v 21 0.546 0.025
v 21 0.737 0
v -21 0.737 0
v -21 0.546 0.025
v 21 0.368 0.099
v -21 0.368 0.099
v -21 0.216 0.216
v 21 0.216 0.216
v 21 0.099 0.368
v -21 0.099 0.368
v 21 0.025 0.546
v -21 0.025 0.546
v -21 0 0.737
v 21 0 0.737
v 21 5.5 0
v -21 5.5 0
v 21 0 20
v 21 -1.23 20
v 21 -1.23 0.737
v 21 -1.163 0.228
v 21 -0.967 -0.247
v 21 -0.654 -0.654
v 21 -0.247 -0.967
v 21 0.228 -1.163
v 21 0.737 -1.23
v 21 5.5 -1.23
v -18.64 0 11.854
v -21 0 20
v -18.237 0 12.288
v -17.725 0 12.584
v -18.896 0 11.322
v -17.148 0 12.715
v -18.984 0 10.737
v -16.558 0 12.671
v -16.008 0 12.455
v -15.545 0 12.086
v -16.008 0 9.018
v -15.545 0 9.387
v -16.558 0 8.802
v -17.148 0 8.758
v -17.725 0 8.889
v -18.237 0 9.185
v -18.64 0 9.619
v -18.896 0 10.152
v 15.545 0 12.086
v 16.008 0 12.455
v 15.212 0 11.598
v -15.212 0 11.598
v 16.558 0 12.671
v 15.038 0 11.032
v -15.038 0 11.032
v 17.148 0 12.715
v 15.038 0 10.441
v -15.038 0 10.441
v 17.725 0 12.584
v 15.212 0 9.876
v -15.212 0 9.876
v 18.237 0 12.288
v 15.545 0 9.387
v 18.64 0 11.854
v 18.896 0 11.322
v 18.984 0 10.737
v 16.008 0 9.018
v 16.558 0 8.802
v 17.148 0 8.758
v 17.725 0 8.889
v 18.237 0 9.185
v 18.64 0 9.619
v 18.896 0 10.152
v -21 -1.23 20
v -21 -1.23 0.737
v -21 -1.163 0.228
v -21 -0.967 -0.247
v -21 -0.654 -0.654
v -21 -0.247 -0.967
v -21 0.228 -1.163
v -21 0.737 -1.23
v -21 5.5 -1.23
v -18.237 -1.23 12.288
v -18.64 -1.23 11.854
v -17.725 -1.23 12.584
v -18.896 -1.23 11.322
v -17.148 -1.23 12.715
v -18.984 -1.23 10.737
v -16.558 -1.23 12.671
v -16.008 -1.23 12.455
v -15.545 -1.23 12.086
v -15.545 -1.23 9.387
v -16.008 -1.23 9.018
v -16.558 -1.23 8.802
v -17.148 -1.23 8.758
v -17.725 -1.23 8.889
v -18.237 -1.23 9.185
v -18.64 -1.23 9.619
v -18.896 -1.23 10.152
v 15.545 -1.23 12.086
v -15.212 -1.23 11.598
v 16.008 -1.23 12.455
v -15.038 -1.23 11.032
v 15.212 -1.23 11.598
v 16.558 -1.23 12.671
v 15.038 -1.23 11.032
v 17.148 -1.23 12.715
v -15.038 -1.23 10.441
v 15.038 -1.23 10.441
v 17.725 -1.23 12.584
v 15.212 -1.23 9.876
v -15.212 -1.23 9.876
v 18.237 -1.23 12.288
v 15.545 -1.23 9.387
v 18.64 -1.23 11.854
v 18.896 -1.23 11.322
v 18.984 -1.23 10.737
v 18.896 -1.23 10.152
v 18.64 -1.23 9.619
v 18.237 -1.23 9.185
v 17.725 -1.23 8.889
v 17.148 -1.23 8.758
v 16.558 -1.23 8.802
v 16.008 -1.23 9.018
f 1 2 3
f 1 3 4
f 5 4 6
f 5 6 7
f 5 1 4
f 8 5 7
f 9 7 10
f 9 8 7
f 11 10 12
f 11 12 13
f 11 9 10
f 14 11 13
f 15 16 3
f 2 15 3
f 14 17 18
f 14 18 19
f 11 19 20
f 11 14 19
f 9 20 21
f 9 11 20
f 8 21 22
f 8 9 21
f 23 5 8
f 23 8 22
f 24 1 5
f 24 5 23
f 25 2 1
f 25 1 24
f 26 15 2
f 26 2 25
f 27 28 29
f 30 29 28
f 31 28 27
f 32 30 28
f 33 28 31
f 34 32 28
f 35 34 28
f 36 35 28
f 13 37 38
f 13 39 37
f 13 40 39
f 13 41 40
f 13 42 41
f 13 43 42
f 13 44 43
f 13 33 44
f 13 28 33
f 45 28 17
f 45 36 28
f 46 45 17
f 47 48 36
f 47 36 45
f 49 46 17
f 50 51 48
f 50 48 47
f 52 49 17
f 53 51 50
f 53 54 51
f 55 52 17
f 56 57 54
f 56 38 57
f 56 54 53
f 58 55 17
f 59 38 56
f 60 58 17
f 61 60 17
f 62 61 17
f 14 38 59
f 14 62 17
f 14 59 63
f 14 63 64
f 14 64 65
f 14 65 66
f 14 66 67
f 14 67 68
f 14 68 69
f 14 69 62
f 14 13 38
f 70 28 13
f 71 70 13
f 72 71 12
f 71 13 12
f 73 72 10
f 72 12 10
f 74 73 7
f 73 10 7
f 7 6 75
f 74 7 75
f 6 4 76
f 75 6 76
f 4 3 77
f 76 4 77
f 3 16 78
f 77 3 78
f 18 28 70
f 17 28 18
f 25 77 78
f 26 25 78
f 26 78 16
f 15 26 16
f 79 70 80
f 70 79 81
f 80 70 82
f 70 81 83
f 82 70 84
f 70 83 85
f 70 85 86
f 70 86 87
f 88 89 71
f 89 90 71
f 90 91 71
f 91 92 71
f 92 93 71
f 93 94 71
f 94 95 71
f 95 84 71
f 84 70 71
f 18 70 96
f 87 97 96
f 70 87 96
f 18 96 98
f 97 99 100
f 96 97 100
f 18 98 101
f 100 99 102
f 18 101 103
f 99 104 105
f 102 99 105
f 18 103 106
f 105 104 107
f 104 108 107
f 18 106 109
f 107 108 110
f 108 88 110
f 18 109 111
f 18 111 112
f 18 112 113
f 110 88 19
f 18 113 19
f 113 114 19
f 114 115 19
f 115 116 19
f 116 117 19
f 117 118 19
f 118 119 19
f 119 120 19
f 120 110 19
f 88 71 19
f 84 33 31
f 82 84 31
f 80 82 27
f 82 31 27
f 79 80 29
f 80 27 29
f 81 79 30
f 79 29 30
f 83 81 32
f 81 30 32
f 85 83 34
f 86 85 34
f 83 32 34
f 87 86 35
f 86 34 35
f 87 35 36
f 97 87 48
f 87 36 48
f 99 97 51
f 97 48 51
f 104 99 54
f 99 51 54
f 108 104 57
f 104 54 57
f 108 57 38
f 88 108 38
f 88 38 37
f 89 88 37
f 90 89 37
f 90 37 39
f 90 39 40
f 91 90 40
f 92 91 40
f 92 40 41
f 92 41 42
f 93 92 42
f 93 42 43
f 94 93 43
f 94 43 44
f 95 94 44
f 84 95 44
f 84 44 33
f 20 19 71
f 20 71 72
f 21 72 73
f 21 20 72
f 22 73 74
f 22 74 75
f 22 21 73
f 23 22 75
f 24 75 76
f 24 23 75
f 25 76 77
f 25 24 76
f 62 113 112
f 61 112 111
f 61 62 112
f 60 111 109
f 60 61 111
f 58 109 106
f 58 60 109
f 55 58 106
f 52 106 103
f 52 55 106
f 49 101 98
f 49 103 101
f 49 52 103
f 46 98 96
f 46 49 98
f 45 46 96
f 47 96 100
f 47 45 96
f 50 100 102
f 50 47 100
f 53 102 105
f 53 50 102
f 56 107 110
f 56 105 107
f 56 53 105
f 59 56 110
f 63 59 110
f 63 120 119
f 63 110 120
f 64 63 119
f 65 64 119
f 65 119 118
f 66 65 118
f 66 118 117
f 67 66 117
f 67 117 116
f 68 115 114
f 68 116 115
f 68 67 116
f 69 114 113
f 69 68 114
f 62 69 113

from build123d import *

# Parameters (mm, degrees)
SKETCH1_W                    = 42
SKETCH1_H                    = 1.23
BASE_FLANGE1_DEPTH           = 20
EDGE_FLANGE1_STRIP_W         = 6.3932
EDGE_FLANGE1_STRIP_H         = 1.23
EDGE_FLANGE1_STRIP_CUT_DEPTH = 42
EDGE_FLANGE1_DEPTH           = 42
SKETCH9_R                    = 1.984375
CUT_EXTRUDE1_DEPTH           = 30.516944286


# Sheet-metal steps are written as plain solids
with BuildPart() as part:
    # Sketch1 → Base-Flange1 (new body)
    with BuildSketch(Plane.XY):
        with Locations((0, -0.615)):
            Rectangle(SKETCH1_W, SKETCH1_H)
    extrude(amount=BASE_FLANGE1_DEPTH)

    # Edge-Flange1 strip (across the edge) → Edge-Flange1 strip cut (cut)
    with BuildSketch(Plane.ZY.offset(-21)):
        with Locations((-2.46, -0.615)):
            Rectangle(EDGE_FLANGE1_STRIP_W, EDGE_FLANGE1_STRIP_H)
    extrude(amount=EDGE_FLANGE1_STRIP_CUT_DEPTH, mode=Mode.SUBTRACT)

    # Edge-Flange1 section (across the edge) → Edge-Flange1 (add)
    with BuildSketch(Plane.ZY.offset(-21)):
        with BuildLine():
            Line((-1.23, 0.7366), (-1.23, 5.5))
            Line((-1.23, 5.5), (0, 5.5))
            Line((0, 5.5), (0, 0.7366))
            ThreePointArc((0, 0.7366), (0.215745145, 0.215745145), (0.7366, 0))
            Line((0.7366, 0), (0.7366, -1.23))
            ThreePointArc((0.7366, -1.23), (-0.653996196, -0.653996196), (-1.23, 0.7366))
        make_face()
    extrude(amount=EDGE_FLANGE1_DEPTH)

    # Sketch9 → Cut-Extrude1 (cut, through all)
    with BuildSketch(Plane(origin=(0, 0, 0), x_dir=(1, 0, 0), z_dir=(0, 1, 0))):
        with Locations(Location((-17, -10.7366, 0), (0, 0, 180))):
            Circle(SKETCH9_R)
    cut_extrude1 = extrude(amount=-CUT_EXTRUDE1_DEPTH, mode=Mode.SUBTRACT)

    # Mirror1: Cut-Extrude1 across plane
    add(cut_extrude1.mirror(Plane(origin=(0, 0, 0), x_dir=(0, 0, 1), z_dir=(1, 0, 0))), mode=Mode.SUBTRACT)


solid = part.part
